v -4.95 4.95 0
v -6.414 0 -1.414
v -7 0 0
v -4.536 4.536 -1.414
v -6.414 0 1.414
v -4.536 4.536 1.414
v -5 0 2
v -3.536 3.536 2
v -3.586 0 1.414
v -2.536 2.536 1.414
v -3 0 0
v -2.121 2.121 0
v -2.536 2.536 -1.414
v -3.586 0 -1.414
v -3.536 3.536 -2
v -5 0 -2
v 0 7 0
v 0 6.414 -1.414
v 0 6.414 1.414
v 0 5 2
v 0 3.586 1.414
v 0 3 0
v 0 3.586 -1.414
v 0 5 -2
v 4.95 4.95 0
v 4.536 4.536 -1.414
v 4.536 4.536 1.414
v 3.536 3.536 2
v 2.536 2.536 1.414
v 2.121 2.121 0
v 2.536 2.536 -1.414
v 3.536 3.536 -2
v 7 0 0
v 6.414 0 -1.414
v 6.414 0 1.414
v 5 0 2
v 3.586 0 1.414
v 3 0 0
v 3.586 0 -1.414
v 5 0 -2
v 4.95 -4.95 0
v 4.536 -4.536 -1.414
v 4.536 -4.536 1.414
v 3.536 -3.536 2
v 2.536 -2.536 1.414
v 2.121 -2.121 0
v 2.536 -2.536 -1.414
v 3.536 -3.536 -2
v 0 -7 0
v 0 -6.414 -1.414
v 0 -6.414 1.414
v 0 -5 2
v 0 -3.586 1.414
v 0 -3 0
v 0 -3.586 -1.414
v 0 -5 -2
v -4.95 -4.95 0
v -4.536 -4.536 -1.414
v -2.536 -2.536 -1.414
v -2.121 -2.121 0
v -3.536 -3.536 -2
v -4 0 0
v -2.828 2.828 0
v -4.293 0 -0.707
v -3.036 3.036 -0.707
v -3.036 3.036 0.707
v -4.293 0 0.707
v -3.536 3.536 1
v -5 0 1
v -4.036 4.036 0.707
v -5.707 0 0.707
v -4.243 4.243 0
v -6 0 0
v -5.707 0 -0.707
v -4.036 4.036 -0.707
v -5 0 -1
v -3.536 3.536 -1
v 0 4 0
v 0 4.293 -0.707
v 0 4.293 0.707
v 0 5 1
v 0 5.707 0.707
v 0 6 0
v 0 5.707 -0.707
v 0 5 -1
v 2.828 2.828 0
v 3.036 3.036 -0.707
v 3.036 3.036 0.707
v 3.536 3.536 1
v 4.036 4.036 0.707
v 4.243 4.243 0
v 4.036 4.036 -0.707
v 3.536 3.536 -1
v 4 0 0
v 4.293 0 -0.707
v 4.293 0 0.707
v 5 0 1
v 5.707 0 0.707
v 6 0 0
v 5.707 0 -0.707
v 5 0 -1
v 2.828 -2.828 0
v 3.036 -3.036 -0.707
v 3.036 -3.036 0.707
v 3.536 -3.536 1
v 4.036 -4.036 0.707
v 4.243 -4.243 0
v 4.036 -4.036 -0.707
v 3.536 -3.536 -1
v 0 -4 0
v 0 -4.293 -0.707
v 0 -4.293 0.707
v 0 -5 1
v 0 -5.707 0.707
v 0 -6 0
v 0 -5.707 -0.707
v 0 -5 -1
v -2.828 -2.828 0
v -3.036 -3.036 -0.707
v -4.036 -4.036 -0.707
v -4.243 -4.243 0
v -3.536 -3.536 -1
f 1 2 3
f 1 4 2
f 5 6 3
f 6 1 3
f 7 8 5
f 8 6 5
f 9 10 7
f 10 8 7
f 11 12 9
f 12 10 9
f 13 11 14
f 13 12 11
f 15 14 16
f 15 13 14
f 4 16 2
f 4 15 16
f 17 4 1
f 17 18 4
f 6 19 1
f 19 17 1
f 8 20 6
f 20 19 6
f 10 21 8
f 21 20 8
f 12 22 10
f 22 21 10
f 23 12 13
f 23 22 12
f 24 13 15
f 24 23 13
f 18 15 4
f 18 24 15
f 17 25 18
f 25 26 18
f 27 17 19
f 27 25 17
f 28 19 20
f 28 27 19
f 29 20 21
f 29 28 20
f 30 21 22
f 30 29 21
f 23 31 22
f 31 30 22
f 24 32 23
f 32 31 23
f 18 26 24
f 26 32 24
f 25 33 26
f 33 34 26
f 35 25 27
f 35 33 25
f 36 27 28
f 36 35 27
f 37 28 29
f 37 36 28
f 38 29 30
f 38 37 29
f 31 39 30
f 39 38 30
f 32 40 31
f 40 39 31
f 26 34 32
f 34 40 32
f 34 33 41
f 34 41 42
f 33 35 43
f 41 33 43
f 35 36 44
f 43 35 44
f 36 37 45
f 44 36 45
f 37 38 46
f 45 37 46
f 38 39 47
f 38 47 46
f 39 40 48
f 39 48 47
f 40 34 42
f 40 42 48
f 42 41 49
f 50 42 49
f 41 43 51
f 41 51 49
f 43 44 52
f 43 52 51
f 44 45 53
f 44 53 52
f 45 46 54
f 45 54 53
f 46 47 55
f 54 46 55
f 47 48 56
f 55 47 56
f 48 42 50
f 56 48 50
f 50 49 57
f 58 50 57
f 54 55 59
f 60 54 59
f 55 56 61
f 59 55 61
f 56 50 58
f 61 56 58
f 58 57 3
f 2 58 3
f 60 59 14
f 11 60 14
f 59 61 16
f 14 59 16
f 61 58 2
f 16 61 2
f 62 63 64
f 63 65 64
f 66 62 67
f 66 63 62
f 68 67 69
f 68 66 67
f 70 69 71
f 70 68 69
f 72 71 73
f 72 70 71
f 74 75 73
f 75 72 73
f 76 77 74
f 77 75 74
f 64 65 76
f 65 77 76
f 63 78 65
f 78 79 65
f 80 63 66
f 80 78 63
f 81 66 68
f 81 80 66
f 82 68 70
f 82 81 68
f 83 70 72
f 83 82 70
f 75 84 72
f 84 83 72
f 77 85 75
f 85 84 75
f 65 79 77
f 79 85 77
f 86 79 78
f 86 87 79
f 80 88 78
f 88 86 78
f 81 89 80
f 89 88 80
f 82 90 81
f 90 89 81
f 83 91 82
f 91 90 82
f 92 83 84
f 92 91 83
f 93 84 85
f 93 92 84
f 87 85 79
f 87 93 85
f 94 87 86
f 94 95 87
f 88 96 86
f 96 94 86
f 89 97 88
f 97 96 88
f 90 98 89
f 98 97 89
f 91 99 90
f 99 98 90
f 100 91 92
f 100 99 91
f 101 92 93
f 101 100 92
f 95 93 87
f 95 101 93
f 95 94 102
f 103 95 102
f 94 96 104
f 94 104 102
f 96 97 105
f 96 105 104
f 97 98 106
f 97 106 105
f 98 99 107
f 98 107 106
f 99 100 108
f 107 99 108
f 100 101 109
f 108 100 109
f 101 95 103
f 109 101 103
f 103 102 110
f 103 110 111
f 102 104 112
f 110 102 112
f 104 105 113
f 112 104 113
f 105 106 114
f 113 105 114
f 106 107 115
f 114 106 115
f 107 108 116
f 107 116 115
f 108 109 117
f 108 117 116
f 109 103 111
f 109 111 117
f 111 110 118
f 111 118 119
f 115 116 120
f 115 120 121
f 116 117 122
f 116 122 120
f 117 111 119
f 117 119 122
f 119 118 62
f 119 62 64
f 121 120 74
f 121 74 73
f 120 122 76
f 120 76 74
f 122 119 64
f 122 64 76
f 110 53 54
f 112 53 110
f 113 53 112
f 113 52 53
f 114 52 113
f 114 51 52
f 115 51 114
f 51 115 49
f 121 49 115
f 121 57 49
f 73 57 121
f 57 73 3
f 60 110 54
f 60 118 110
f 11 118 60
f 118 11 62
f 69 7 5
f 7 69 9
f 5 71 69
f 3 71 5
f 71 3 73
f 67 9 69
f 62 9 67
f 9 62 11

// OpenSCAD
difference() {
    rotate_extrude(convexity=4, $fn=8)
    translate([5,0,0]) difference() {
        circle(r=2);
        circle(r=1);
    }
    translate([-5,-5,5]) cube(10, center=true);
}
